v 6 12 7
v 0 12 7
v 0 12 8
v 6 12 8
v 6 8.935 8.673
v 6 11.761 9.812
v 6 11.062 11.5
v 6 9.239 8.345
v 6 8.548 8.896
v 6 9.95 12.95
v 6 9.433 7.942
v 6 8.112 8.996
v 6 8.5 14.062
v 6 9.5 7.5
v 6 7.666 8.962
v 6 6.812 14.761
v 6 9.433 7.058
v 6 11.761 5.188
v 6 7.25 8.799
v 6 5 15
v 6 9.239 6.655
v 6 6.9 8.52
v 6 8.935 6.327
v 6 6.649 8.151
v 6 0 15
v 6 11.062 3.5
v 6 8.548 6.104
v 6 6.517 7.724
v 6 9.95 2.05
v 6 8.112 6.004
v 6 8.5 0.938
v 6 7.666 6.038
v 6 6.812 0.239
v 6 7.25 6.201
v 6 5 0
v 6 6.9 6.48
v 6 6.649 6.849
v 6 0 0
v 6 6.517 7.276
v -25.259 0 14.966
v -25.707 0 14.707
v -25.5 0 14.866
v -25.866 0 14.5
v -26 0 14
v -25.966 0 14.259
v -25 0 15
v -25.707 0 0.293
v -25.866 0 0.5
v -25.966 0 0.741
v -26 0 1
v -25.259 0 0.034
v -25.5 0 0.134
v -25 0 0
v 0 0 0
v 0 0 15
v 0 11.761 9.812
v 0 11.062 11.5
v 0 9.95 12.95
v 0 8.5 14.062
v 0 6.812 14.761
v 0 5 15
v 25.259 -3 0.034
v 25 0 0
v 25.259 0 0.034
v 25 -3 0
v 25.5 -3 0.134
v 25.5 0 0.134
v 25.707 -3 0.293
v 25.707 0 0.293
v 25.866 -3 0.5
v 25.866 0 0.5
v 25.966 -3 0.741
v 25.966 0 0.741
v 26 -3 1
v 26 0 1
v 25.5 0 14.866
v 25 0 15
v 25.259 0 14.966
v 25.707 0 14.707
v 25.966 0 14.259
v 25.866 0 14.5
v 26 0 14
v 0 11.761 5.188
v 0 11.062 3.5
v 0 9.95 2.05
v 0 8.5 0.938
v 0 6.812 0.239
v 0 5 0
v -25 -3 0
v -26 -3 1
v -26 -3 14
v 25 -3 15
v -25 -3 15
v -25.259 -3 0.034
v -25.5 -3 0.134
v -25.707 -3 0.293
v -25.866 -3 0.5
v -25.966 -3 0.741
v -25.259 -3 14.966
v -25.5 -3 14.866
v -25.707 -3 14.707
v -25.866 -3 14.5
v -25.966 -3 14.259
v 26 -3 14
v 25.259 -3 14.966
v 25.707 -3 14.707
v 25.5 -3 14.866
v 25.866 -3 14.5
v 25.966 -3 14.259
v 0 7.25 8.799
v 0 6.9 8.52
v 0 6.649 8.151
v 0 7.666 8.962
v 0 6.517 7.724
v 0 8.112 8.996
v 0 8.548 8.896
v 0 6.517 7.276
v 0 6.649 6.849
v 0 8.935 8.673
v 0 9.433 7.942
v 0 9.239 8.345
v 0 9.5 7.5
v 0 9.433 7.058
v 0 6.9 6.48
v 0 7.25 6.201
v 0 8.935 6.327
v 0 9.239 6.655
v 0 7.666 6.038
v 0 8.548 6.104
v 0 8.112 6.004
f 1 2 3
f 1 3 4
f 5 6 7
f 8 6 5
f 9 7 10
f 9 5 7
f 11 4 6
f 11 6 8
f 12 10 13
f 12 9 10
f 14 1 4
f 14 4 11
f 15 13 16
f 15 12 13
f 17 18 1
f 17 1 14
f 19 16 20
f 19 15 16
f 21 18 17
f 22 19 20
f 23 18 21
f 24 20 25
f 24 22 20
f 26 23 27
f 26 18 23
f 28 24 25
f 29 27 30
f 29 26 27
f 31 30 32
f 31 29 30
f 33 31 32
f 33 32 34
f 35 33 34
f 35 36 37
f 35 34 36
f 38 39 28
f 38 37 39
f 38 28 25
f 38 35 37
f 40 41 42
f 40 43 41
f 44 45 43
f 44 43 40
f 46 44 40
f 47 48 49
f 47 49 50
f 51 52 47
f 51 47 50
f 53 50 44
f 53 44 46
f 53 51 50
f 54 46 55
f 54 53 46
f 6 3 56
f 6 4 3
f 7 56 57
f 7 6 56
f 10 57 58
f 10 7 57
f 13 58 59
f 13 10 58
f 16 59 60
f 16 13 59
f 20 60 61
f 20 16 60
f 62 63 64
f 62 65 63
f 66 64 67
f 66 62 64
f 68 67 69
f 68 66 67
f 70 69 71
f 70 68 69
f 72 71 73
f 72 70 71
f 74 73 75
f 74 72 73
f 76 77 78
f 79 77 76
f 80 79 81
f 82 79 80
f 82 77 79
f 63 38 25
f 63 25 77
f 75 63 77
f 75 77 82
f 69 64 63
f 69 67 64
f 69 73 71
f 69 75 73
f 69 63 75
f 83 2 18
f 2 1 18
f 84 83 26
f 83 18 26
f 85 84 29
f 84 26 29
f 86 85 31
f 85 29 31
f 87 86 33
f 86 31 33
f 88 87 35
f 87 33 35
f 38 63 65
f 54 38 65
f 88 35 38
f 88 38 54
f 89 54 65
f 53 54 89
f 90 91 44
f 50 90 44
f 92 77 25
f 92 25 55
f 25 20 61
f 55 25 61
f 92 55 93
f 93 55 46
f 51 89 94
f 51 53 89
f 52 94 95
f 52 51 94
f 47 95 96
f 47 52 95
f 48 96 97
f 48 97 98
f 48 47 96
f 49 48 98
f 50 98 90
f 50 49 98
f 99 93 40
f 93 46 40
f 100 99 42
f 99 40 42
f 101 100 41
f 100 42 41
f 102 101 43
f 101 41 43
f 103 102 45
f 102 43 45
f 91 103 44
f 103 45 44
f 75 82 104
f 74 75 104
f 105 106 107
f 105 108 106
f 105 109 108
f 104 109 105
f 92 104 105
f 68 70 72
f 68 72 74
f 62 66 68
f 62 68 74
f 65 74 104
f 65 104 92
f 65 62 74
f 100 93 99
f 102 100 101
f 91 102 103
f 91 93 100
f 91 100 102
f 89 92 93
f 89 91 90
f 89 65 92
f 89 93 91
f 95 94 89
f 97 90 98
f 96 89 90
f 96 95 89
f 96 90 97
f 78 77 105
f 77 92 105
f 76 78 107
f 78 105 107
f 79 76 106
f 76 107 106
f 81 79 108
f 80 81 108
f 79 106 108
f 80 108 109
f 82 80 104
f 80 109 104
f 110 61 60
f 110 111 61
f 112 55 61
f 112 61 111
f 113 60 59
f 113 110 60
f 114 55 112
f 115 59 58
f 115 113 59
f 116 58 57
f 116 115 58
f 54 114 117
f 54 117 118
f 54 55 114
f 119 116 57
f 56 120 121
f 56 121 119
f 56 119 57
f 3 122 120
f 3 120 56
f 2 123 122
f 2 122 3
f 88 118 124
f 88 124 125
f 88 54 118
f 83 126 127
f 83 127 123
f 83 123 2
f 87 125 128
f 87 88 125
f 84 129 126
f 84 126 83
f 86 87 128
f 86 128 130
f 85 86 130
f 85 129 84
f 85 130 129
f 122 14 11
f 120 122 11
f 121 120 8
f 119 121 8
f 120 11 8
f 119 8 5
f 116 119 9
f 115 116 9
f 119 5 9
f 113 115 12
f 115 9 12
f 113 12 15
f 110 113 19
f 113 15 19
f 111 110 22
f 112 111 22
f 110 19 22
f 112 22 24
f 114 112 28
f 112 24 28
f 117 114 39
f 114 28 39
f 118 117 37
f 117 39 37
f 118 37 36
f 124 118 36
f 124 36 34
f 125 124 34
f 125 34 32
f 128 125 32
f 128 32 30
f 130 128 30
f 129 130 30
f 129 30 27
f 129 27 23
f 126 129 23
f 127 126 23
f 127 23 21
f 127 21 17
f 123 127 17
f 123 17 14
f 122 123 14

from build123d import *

# Parameters (mm, degrees)
PAD_DEPTH    = 15
FILLET_R     = 7
FILLET001_R  = 1
SKETCH001_R  = 1.5
POCKET_DEPTH = 32.001


with BuildPart() as part:
    # Sketch → Pad (new body)
    with BuildSketch(Plane.XY):
        Polygon((-26, 0), (0, 0), (0, 12), (6, 12), (6, 0), (26, 0), (26, -3), (-26, -3), align=None)
    extrude(amount=PAD_DEPTH)

    # Fillet
    fillet_edges = [part.edges().sort_by_distance(p)[0] for p in [
        (3, 12, 0),
        (3, 12, 15),
    ]]
    fillet(fillet_edges, radius=FILLET_R)

    # Fillet001
    fillet001_edges = [part.edges().sort_by_distance(p)[0] for p in [
        (26, -1.5, 0),
        (26, -1.5, 15),
        (-26, -1.5, 0),
        (-26, -1.5, 15),
    ]]
    fillet(fillet001_edges, radius=FILLET001_R)

    # Sketch001 (on Face8 of Fillet001) → Pocket (cut, through all)
    with BuildSketch(Plane.YZ.offset(6)):
        with Locations((8, 7.5)):
            Circle(SKETCH001_R)
    extrude(amount=-POCKET_DEPTH, mode=Mode.SUBTRACT)


solid = part.part
